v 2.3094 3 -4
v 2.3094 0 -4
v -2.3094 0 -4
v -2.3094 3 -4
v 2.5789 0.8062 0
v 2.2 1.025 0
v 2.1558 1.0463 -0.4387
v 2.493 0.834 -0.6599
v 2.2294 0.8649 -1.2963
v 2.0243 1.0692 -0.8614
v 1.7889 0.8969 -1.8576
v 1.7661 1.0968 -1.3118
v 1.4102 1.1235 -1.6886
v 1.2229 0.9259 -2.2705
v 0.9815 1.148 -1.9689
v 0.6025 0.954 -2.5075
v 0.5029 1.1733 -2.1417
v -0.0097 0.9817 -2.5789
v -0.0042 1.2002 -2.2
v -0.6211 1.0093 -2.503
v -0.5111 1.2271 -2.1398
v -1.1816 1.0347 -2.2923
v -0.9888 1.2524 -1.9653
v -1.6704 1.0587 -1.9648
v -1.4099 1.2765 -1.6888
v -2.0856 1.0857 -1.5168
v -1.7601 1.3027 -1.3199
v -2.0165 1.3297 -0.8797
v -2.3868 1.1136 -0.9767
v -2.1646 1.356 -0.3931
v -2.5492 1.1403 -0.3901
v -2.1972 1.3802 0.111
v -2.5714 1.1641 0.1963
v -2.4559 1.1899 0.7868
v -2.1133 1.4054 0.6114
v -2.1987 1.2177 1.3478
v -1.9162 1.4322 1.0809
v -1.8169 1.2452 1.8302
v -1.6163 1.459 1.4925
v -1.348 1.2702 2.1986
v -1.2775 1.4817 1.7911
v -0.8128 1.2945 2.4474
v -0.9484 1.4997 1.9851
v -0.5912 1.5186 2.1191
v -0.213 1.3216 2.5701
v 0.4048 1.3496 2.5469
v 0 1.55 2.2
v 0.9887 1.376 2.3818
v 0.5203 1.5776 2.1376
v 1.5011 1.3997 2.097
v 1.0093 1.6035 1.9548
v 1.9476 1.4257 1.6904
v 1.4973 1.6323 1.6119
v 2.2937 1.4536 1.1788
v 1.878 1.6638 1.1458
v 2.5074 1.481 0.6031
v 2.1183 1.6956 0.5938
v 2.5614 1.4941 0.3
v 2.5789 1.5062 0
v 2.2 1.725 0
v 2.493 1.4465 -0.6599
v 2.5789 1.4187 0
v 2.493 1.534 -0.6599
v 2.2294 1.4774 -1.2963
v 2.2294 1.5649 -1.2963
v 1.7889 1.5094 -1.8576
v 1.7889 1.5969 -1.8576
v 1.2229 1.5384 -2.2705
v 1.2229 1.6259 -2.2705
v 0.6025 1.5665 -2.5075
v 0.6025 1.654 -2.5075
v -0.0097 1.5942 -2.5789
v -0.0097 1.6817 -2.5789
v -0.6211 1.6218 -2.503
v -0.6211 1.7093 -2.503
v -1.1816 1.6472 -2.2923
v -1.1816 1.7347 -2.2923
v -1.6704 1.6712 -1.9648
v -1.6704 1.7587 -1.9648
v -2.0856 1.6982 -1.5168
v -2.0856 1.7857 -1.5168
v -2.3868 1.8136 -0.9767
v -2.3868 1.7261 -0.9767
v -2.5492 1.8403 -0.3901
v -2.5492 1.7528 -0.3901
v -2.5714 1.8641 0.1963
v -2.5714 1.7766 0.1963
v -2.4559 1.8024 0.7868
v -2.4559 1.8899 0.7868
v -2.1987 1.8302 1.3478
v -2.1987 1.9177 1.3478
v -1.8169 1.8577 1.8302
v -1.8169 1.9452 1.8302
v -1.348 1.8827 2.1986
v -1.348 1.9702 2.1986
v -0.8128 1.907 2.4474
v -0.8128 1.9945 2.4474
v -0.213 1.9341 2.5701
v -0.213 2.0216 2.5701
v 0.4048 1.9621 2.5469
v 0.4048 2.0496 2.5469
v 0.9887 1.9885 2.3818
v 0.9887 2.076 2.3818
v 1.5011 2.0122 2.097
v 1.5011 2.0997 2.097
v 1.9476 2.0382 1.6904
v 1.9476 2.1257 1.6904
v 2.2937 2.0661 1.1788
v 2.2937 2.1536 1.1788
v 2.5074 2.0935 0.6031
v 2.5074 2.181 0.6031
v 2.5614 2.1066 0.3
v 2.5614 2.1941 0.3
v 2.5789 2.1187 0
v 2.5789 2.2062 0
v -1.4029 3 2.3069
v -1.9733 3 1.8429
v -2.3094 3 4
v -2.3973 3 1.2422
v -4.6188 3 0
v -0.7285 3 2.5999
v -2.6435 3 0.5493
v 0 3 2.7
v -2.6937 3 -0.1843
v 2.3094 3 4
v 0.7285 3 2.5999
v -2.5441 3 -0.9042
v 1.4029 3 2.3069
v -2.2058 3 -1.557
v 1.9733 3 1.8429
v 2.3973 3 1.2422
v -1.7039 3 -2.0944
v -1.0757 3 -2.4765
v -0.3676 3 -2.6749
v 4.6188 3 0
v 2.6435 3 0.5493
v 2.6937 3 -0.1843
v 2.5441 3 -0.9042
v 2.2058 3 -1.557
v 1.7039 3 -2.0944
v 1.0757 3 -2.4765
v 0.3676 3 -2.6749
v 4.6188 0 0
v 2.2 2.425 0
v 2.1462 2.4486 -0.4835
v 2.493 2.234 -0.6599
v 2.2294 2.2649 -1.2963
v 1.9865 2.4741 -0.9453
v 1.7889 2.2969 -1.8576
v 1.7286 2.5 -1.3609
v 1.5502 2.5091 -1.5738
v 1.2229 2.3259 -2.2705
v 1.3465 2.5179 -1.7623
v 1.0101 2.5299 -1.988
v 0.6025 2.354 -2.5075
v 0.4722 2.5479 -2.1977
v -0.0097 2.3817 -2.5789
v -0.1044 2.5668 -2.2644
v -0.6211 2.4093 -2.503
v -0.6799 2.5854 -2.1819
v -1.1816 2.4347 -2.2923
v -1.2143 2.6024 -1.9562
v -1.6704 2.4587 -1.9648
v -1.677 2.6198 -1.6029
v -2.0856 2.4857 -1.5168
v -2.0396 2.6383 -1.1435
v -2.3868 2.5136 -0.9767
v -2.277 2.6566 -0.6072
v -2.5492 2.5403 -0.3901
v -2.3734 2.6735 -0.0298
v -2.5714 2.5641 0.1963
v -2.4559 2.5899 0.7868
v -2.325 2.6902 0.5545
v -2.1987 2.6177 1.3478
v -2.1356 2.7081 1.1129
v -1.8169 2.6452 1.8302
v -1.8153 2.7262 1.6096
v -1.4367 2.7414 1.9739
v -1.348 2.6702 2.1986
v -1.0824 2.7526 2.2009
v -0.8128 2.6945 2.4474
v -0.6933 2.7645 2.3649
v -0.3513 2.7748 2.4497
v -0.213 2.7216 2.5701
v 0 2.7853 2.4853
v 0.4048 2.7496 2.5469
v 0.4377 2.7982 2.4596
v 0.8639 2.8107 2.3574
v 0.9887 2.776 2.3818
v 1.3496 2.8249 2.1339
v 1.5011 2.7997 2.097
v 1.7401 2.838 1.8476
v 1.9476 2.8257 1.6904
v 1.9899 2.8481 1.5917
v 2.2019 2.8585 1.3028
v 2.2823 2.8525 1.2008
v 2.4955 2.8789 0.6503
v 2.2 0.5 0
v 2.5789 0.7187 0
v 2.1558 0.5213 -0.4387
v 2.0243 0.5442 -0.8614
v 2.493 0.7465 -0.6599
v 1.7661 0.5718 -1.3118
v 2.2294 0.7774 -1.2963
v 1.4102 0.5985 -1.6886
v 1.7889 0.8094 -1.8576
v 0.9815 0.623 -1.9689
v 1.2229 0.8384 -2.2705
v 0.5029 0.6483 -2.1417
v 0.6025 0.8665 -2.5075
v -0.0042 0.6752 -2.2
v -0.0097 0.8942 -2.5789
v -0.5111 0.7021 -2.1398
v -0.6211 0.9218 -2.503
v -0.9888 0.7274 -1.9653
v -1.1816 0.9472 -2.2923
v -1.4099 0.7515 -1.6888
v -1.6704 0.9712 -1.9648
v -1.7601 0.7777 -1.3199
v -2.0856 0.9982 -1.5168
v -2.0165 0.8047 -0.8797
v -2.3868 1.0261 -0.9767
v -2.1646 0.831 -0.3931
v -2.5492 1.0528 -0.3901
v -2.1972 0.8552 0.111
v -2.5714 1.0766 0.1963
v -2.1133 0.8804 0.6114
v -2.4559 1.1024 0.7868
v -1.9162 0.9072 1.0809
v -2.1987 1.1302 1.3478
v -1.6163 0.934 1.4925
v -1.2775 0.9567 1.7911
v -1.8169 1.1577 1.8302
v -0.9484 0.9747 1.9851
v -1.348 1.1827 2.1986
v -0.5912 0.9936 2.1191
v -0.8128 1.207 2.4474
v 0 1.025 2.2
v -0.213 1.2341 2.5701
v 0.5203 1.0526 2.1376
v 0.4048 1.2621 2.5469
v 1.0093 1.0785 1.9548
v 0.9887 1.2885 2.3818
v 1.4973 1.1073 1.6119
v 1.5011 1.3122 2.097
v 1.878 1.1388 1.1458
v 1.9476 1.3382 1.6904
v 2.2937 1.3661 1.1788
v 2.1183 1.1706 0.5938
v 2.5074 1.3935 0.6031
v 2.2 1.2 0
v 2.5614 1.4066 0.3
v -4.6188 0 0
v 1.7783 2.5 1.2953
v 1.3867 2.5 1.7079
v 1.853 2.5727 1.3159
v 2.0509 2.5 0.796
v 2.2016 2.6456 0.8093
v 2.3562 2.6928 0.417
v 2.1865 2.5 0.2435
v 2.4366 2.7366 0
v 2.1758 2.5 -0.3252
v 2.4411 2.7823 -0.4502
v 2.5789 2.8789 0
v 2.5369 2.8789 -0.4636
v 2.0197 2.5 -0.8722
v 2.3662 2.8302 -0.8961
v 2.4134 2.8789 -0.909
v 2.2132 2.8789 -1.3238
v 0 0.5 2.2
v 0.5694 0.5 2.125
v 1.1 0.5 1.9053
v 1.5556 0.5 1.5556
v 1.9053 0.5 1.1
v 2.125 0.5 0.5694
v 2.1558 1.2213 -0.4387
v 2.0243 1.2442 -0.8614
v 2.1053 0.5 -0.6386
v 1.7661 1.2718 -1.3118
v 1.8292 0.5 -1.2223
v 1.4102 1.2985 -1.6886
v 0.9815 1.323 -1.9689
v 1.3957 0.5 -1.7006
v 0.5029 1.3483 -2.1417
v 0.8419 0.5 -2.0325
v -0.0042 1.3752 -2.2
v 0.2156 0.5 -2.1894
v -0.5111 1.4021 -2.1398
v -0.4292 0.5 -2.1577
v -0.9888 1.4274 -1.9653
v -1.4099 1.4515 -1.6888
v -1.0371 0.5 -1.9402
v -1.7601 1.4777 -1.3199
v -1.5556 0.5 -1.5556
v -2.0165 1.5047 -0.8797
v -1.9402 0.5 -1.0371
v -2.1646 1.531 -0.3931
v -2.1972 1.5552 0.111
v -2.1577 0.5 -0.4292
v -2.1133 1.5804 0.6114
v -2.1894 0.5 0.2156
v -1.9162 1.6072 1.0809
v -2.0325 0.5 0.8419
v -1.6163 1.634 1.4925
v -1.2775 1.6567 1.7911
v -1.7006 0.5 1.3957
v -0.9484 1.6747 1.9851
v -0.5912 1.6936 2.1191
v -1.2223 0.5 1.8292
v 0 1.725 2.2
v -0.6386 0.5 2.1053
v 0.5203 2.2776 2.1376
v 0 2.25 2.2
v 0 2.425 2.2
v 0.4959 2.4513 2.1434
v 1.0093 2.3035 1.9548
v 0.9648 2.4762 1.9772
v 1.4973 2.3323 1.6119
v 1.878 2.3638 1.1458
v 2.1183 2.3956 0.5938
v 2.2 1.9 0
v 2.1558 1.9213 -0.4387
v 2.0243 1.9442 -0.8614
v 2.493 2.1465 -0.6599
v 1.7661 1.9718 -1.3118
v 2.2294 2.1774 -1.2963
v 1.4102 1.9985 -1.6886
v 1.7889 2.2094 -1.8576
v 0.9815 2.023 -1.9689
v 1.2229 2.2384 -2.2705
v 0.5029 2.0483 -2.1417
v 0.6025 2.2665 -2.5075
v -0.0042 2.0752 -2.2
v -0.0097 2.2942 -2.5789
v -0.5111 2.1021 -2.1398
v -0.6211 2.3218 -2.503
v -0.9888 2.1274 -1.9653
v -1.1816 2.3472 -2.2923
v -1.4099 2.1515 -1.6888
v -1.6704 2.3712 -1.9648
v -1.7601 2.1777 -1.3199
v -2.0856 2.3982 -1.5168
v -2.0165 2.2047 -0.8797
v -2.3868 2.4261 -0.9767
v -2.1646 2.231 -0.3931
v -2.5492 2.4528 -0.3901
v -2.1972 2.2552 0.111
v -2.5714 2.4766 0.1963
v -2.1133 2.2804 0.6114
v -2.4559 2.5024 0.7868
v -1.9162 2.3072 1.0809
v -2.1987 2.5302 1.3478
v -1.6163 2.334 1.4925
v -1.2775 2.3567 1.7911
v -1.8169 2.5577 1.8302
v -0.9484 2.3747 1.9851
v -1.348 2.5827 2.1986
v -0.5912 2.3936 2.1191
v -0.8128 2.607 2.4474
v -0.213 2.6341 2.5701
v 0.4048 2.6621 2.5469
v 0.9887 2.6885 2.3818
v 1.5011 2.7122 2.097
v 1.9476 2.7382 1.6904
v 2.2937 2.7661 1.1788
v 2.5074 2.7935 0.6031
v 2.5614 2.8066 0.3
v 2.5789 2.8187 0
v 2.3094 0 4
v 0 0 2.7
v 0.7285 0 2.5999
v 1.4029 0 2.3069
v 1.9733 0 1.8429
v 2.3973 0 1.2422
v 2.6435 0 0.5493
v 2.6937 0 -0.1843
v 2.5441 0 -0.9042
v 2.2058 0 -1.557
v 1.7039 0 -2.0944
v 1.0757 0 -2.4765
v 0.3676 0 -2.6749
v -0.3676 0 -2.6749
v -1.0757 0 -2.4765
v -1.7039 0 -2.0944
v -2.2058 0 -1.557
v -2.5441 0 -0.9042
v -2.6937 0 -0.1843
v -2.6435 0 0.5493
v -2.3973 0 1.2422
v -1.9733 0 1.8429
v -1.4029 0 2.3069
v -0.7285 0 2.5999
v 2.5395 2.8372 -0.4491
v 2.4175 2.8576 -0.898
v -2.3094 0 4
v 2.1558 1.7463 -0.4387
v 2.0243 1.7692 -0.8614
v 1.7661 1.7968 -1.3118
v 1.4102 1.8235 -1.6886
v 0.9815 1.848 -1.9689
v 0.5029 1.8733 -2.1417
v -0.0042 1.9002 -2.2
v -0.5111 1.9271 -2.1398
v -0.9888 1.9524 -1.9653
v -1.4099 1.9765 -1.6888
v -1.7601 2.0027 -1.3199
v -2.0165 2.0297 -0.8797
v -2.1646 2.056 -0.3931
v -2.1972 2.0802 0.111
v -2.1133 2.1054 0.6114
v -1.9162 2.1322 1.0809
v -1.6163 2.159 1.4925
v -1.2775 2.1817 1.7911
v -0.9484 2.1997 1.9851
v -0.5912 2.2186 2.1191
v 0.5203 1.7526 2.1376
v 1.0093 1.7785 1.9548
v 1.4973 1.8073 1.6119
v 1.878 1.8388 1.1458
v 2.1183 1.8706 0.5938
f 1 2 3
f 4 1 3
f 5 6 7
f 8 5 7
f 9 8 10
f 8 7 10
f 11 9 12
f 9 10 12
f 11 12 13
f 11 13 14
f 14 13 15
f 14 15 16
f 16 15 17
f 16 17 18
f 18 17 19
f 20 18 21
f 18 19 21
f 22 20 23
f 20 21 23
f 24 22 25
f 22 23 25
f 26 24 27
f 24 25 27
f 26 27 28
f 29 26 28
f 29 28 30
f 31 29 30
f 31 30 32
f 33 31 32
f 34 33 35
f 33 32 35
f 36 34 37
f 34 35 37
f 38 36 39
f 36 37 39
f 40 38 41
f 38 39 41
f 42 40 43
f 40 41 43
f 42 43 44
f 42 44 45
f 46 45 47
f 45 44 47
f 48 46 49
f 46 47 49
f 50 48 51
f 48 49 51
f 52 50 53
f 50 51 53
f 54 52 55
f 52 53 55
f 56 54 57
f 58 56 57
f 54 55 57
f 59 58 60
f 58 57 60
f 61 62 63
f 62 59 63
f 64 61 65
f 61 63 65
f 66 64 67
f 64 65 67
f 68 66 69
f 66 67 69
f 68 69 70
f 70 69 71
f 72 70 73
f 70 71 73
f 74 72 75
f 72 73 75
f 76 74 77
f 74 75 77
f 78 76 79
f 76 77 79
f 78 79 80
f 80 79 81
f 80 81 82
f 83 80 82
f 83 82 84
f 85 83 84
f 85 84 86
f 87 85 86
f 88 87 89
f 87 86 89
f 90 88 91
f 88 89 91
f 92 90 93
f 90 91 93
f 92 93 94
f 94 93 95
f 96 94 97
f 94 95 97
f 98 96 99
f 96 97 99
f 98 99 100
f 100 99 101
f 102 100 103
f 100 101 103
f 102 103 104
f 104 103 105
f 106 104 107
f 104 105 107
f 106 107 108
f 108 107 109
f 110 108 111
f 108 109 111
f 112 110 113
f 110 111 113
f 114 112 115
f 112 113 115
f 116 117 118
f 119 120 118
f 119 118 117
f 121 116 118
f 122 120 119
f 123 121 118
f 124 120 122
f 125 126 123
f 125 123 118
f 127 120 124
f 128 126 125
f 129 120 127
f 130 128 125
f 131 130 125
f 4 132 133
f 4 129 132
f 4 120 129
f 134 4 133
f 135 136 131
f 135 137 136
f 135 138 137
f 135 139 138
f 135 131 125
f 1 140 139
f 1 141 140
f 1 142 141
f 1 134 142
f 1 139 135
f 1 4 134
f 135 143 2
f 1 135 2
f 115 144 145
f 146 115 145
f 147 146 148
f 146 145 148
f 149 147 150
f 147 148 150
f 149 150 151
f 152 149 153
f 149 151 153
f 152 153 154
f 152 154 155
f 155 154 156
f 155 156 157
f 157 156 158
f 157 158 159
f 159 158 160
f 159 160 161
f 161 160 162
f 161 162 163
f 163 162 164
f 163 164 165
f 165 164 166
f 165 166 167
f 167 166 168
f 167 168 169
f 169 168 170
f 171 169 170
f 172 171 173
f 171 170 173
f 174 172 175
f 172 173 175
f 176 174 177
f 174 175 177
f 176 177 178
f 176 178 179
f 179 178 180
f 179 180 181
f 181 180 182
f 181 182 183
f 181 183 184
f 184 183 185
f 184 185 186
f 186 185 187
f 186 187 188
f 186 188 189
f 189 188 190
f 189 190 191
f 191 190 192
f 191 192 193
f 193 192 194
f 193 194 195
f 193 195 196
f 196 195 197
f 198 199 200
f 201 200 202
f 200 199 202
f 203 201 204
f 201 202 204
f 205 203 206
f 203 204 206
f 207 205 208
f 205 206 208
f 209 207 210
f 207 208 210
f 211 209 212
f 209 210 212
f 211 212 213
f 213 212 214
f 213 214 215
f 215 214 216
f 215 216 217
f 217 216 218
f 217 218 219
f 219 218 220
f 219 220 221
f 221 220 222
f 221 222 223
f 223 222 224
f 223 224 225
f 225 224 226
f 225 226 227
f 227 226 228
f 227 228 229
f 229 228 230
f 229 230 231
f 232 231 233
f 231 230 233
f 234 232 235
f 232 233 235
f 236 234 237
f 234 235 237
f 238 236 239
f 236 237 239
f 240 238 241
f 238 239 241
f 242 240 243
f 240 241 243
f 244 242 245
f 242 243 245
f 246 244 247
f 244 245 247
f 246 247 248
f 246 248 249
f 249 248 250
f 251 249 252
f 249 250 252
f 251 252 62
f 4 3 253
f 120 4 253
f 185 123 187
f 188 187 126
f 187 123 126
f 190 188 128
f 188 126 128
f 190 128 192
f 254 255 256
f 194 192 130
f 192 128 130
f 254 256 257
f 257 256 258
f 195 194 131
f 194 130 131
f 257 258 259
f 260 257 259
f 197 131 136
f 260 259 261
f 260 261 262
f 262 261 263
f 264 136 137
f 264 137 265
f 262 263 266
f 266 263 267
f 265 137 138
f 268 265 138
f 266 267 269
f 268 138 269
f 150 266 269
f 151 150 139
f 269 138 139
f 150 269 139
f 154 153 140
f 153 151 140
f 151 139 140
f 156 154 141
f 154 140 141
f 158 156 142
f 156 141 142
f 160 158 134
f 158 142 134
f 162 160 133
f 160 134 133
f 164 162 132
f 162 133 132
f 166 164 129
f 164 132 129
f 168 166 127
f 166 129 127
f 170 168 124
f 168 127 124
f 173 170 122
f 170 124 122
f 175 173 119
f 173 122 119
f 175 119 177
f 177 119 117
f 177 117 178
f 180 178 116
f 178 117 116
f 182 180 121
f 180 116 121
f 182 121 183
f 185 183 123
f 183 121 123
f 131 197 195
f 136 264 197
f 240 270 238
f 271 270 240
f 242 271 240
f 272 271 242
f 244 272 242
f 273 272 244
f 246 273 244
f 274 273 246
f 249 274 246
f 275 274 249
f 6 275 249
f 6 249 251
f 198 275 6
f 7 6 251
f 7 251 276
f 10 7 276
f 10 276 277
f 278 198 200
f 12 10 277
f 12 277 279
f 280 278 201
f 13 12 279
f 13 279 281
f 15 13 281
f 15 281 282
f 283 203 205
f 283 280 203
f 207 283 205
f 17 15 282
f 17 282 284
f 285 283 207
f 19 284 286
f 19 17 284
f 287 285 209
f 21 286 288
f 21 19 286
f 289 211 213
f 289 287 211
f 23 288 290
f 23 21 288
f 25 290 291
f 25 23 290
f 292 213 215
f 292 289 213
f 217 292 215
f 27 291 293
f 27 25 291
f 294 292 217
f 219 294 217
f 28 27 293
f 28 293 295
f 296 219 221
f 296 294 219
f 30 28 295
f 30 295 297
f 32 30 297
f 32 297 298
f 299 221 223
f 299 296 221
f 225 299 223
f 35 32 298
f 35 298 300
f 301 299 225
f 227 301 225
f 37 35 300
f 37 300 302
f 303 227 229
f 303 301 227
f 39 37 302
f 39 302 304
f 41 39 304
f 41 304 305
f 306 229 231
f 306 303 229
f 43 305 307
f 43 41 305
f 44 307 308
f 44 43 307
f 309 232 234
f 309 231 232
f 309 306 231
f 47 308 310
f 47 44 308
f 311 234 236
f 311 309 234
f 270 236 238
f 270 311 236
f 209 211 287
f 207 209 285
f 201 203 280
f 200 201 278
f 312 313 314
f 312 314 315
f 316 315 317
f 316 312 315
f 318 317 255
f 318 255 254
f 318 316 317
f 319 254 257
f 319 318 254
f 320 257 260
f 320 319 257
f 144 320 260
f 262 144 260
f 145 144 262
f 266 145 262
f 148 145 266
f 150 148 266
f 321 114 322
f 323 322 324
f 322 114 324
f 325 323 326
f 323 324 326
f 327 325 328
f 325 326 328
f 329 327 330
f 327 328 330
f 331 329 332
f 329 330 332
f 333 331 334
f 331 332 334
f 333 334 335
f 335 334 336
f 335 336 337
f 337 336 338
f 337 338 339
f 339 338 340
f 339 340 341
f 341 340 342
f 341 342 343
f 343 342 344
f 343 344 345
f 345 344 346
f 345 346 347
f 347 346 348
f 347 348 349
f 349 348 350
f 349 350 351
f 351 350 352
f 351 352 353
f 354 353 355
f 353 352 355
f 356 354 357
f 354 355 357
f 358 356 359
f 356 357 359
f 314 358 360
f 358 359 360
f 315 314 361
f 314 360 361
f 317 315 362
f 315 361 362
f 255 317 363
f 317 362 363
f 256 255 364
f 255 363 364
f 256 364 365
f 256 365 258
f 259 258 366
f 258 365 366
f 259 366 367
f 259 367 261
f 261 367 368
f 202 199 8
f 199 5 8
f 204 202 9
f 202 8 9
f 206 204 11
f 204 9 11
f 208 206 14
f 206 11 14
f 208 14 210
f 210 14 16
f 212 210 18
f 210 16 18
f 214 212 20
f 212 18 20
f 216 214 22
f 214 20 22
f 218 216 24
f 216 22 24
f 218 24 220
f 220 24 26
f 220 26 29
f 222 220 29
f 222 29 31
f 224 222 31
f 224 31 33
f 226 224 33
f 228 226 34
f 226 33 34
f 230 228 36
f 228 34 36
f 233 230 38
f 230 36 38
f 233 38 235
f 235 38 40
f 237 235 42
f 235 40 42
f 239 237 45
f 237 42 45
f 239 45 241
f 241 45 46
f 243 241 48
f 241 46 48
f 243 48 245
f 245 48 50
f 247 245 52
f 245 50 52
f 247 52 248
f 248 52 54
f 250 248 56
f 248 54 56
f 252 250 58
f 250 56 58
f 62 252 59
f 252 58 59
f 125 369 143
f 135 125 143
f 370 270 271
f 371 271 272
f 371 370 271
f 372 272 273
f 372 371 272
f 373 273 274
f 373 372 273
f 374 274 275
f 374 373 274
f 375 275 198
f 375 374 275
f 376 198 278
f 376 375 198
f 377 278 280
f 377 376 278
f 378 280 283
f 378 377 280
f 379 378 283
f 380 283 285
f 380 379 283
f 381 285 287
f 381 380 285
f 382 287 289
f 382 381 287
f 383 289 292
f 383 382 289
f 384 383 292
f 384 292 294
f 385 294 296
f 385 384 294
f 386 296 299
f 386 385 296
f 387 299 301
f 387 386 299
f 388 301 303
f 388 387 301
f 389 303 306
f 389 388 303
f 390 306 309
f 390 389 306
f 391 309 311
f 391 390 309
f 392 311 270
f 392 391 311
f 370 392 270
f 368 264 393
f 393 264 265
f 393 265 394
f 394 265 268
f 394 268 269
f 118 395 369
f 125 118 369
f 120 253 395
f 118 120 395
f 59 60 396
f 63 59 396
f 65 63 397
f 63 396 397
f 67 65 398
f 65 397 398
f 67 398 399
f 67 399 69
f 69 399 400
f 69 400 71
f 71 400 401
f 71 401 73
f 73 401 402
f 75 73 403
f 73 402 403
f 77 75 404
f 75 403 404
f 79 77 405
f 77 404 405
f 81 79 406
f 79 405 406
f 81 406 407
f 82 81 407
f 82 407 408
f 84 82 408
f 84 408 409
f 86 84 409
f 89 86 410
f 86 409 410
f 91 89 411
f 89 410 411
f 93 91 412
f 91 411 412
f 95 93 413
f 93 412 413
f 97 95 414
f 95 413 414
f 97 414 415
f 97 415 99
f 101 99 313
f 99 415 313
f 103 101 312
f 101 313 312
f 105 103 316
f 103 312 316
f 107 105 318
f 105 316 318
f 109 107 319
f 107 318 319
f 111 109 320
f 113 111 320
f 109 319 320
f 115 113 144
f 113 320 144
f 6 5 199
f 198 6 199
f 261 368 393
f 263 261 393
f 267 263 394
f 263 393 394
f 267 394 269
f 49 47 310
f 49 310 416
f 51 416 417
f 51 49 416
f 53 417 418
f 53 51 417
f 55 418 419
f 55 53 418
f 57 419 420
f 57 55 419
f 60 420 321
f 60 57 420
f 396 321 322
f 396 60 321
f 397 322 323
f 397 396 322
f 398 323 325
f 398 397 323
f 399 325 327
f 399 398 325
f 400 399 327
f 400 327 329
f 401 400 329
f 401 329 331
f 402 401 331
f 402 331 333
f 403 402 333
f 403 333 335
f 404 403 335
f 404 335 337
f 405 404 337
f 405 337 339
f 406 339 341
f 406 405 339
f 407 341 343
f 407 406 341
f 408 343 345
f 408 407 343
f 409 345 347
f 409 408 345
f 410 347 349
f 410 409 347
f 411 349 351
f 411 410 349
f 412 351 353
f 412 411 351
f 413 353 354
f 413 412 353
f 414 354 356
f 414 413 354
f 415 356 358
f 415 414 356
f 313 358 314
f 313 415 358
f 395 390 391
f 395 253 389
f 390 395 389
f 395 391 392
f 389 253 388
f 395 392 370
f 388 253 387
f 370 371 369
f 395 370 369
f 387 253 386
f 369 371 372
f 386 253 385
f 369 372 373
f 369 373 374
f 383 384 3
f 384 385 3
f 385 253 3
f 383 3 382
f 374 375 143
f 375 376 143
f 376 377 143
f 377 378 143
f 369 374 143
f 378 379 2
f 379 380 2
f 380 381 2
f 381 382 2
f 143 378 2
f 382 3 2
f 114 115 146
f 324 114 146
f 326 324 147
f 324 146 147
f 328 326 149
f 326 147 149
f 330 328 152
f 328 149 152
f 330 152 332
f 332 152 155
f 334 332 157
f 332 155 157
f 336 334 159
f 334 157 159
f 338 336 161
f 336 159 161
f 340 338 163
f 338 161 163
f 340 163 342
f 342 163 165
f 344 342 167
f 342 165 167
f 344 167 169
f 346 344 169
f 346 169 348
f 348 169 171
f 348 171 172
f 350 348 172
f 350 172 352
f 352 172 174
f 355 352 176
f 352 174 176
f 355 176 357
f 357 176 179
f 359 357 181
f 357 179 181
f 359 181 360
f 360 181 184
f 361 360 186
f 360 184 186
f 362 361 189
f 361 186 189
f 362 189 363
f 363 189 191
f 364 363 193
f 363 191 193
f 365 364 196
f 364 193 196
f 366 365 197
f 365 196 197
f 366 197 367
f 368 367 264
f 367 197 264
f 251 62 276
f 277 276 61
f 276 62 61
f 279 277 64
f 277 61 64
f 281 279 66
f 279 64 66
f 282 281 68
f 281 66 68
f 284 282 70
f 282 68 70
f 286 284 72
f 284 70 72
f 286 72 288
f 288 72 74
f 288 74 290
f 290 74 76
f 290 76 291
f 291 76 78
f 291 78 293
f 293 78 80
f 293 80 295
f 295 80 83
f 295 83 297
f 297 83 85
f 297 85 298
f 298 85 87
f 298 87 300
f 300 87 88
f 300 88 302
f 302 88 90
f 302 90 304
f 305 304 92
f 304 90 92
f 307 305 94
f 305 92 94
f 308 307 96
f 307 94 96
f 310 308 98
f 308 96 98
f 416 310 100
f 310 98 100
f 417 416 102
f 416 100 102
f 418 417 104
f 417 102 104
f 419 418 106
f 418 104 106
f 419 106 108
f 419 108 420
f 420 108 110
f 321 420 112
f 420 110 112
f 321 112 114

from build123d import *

# Parameters (mm, degrees)
SKETCH2_R           = 2.2
BOSS_EXTRUDE1_DEPTH = 3
CHAMFER1_SIZE       = 0.5
THREAD1_PITCH       = 0.7


with BuildPart() as part:
    # Sketch2 → Boss-Extrude1 (new body)
    with BuildSketch(Plane(origin=(0, 0, 0), x_dir=(1, 0, 0), z_dir=(0, 1, 0))):
        Polygon((4.618802154, 0), (2.309401077, 4), (-2.309401077, 4), (-4.618802154, 0), (-2.309401077, -4), (2.309401077, -4), align=None)
        with Locations(Location((0, 0, 0), (0, 0, 270))):
            Circle(SKETCH2_R, mode=Mode.SUBTRACT)
    extrude(amount=BOSS_EXTRUDE1_DEPTH)

    # Chamfer1
    chamfer1_edges = [part.edges().sort_by_distance(p)[0] for p in [
        (0, 0, -2.2),
        (0, 3, -2.2),
    ]]
    chamfer(chamfer1_edges, length=CHAMFER1_SIZE)

    # Thread1: the profile of Thread Profile1 profile screwed along a right-hand helix of 5.714286 turns, 6 arcs to a turn; built about Z, then put on its axis
    thread1_z = Axis((0, 0, 0), (0, 0, 1))
    thread1_corners = [(2.1997, 0, -0.000173205), (2.578886113, 0, 0.218749999), (2.578886113, 0, 0.306249999), (2.1997, 0, 0.525173203)]
    with BuildLine(mode=Mode.PRIVATE) as thread1_profile:
        Line(thread1_corners[0], thread1_corners[1])
        Line(thread1_corners[1], thread1_corners[2])
        Line(thread1_corners[2], thread1_corners[3])
        Line(thread1_corners[3], thread1_corners[0])
    thread1_cap = Face(thread1_profile.wire())
    thread1_turn_angles = [0, 30, 60, 90, 120, 150, 180, 210, 240, 270, 300, 330, 360]
    thread1_turn_weights = [1, 0.8660254037844387, 1, 0.8660254037844387, 1, 0.8660254037844387, 1, 0.8660254037844387, 1, 0.8660254037844387, 1, 0.8660254037844387, 1]
    thread1_turn_rails = [Edge.make_bspline([Vector(p[0], p[1], 0).rotate(thread1_z, thread1_turn_angles[k]) / thread1_turn_weights[k] + Vector(0, 0, p[2] + THREAD1_PITCH * thread1_turn_angles[k] / 360) for k in range(13)], [0, 0, 0, 1, 1, 2, 2, 3, 3, 4, 4, 5, 5, 6, 6, 6], 2, thread1_turn_weights) for p in thread1_corners]
    thread1_turn_sides = [Face.make_surface_from_curves(thread1_turn_rails[p[0]], thread1_turn_rails[p[1]]) for p in [(0, 1), (1, 2), (2, 3), (3, 0)]]
    thread1_last_angles = [1800, 1830, 1860, 1890, 1920, 1950, 1980, 2010, 2040, 2048.571428571, 2057.142857143]
    thread1_last_weights = [1, 0.8660254037844387, 1, 0.8660254037844387, 1, 0.8660254037844387, 1, 0.8660254037844387, 1, 0.9888308262251283, 1]
    thread1_last_rails = [Edge.make_bspline([Vector(p[0], p[1], 0).rotate(thread1_z, thread1_last_angles[k]) / thread1_last_weights[k] + Vector(0, 0, p[2] + THREAD1_PITCH * thread1_last_angles[k] / 360) for k in range(11)], [0, 0, 0, 1, 1, 2, 2, 3, 3, 4, 4, 5, 5, 5], 2, thread1_last_weights) for p in thread1_corners]
    thread1_last_sides = [Face.make_surface_from_curves(thread1_last_rails[p[0]], thread1_last_rails[p[1]]) for p in [(0, 1), (1, 2), (2, 3), (3, 0)]]
    thread1 = Plane(origin=(0, 0.5, 0), x_dir=(1, 0, 0), z_dir=(0, 1, 0)) * Solid(Shell([*[p.moved(Location((0, 0, THREAD1_PITCH * i))) for i in range(5) for p in thread1_turn_sides], *thread1_last_sides, thread1_cap, thread1_cap.rotate(thread1_z, 2057.142857143).moved(Location((0, 0, THREAD1_PITCH * 2057.142857143 / 360)))]))
    add(thread1, mode=Mode.SUBTRACT)


solid = part.part
